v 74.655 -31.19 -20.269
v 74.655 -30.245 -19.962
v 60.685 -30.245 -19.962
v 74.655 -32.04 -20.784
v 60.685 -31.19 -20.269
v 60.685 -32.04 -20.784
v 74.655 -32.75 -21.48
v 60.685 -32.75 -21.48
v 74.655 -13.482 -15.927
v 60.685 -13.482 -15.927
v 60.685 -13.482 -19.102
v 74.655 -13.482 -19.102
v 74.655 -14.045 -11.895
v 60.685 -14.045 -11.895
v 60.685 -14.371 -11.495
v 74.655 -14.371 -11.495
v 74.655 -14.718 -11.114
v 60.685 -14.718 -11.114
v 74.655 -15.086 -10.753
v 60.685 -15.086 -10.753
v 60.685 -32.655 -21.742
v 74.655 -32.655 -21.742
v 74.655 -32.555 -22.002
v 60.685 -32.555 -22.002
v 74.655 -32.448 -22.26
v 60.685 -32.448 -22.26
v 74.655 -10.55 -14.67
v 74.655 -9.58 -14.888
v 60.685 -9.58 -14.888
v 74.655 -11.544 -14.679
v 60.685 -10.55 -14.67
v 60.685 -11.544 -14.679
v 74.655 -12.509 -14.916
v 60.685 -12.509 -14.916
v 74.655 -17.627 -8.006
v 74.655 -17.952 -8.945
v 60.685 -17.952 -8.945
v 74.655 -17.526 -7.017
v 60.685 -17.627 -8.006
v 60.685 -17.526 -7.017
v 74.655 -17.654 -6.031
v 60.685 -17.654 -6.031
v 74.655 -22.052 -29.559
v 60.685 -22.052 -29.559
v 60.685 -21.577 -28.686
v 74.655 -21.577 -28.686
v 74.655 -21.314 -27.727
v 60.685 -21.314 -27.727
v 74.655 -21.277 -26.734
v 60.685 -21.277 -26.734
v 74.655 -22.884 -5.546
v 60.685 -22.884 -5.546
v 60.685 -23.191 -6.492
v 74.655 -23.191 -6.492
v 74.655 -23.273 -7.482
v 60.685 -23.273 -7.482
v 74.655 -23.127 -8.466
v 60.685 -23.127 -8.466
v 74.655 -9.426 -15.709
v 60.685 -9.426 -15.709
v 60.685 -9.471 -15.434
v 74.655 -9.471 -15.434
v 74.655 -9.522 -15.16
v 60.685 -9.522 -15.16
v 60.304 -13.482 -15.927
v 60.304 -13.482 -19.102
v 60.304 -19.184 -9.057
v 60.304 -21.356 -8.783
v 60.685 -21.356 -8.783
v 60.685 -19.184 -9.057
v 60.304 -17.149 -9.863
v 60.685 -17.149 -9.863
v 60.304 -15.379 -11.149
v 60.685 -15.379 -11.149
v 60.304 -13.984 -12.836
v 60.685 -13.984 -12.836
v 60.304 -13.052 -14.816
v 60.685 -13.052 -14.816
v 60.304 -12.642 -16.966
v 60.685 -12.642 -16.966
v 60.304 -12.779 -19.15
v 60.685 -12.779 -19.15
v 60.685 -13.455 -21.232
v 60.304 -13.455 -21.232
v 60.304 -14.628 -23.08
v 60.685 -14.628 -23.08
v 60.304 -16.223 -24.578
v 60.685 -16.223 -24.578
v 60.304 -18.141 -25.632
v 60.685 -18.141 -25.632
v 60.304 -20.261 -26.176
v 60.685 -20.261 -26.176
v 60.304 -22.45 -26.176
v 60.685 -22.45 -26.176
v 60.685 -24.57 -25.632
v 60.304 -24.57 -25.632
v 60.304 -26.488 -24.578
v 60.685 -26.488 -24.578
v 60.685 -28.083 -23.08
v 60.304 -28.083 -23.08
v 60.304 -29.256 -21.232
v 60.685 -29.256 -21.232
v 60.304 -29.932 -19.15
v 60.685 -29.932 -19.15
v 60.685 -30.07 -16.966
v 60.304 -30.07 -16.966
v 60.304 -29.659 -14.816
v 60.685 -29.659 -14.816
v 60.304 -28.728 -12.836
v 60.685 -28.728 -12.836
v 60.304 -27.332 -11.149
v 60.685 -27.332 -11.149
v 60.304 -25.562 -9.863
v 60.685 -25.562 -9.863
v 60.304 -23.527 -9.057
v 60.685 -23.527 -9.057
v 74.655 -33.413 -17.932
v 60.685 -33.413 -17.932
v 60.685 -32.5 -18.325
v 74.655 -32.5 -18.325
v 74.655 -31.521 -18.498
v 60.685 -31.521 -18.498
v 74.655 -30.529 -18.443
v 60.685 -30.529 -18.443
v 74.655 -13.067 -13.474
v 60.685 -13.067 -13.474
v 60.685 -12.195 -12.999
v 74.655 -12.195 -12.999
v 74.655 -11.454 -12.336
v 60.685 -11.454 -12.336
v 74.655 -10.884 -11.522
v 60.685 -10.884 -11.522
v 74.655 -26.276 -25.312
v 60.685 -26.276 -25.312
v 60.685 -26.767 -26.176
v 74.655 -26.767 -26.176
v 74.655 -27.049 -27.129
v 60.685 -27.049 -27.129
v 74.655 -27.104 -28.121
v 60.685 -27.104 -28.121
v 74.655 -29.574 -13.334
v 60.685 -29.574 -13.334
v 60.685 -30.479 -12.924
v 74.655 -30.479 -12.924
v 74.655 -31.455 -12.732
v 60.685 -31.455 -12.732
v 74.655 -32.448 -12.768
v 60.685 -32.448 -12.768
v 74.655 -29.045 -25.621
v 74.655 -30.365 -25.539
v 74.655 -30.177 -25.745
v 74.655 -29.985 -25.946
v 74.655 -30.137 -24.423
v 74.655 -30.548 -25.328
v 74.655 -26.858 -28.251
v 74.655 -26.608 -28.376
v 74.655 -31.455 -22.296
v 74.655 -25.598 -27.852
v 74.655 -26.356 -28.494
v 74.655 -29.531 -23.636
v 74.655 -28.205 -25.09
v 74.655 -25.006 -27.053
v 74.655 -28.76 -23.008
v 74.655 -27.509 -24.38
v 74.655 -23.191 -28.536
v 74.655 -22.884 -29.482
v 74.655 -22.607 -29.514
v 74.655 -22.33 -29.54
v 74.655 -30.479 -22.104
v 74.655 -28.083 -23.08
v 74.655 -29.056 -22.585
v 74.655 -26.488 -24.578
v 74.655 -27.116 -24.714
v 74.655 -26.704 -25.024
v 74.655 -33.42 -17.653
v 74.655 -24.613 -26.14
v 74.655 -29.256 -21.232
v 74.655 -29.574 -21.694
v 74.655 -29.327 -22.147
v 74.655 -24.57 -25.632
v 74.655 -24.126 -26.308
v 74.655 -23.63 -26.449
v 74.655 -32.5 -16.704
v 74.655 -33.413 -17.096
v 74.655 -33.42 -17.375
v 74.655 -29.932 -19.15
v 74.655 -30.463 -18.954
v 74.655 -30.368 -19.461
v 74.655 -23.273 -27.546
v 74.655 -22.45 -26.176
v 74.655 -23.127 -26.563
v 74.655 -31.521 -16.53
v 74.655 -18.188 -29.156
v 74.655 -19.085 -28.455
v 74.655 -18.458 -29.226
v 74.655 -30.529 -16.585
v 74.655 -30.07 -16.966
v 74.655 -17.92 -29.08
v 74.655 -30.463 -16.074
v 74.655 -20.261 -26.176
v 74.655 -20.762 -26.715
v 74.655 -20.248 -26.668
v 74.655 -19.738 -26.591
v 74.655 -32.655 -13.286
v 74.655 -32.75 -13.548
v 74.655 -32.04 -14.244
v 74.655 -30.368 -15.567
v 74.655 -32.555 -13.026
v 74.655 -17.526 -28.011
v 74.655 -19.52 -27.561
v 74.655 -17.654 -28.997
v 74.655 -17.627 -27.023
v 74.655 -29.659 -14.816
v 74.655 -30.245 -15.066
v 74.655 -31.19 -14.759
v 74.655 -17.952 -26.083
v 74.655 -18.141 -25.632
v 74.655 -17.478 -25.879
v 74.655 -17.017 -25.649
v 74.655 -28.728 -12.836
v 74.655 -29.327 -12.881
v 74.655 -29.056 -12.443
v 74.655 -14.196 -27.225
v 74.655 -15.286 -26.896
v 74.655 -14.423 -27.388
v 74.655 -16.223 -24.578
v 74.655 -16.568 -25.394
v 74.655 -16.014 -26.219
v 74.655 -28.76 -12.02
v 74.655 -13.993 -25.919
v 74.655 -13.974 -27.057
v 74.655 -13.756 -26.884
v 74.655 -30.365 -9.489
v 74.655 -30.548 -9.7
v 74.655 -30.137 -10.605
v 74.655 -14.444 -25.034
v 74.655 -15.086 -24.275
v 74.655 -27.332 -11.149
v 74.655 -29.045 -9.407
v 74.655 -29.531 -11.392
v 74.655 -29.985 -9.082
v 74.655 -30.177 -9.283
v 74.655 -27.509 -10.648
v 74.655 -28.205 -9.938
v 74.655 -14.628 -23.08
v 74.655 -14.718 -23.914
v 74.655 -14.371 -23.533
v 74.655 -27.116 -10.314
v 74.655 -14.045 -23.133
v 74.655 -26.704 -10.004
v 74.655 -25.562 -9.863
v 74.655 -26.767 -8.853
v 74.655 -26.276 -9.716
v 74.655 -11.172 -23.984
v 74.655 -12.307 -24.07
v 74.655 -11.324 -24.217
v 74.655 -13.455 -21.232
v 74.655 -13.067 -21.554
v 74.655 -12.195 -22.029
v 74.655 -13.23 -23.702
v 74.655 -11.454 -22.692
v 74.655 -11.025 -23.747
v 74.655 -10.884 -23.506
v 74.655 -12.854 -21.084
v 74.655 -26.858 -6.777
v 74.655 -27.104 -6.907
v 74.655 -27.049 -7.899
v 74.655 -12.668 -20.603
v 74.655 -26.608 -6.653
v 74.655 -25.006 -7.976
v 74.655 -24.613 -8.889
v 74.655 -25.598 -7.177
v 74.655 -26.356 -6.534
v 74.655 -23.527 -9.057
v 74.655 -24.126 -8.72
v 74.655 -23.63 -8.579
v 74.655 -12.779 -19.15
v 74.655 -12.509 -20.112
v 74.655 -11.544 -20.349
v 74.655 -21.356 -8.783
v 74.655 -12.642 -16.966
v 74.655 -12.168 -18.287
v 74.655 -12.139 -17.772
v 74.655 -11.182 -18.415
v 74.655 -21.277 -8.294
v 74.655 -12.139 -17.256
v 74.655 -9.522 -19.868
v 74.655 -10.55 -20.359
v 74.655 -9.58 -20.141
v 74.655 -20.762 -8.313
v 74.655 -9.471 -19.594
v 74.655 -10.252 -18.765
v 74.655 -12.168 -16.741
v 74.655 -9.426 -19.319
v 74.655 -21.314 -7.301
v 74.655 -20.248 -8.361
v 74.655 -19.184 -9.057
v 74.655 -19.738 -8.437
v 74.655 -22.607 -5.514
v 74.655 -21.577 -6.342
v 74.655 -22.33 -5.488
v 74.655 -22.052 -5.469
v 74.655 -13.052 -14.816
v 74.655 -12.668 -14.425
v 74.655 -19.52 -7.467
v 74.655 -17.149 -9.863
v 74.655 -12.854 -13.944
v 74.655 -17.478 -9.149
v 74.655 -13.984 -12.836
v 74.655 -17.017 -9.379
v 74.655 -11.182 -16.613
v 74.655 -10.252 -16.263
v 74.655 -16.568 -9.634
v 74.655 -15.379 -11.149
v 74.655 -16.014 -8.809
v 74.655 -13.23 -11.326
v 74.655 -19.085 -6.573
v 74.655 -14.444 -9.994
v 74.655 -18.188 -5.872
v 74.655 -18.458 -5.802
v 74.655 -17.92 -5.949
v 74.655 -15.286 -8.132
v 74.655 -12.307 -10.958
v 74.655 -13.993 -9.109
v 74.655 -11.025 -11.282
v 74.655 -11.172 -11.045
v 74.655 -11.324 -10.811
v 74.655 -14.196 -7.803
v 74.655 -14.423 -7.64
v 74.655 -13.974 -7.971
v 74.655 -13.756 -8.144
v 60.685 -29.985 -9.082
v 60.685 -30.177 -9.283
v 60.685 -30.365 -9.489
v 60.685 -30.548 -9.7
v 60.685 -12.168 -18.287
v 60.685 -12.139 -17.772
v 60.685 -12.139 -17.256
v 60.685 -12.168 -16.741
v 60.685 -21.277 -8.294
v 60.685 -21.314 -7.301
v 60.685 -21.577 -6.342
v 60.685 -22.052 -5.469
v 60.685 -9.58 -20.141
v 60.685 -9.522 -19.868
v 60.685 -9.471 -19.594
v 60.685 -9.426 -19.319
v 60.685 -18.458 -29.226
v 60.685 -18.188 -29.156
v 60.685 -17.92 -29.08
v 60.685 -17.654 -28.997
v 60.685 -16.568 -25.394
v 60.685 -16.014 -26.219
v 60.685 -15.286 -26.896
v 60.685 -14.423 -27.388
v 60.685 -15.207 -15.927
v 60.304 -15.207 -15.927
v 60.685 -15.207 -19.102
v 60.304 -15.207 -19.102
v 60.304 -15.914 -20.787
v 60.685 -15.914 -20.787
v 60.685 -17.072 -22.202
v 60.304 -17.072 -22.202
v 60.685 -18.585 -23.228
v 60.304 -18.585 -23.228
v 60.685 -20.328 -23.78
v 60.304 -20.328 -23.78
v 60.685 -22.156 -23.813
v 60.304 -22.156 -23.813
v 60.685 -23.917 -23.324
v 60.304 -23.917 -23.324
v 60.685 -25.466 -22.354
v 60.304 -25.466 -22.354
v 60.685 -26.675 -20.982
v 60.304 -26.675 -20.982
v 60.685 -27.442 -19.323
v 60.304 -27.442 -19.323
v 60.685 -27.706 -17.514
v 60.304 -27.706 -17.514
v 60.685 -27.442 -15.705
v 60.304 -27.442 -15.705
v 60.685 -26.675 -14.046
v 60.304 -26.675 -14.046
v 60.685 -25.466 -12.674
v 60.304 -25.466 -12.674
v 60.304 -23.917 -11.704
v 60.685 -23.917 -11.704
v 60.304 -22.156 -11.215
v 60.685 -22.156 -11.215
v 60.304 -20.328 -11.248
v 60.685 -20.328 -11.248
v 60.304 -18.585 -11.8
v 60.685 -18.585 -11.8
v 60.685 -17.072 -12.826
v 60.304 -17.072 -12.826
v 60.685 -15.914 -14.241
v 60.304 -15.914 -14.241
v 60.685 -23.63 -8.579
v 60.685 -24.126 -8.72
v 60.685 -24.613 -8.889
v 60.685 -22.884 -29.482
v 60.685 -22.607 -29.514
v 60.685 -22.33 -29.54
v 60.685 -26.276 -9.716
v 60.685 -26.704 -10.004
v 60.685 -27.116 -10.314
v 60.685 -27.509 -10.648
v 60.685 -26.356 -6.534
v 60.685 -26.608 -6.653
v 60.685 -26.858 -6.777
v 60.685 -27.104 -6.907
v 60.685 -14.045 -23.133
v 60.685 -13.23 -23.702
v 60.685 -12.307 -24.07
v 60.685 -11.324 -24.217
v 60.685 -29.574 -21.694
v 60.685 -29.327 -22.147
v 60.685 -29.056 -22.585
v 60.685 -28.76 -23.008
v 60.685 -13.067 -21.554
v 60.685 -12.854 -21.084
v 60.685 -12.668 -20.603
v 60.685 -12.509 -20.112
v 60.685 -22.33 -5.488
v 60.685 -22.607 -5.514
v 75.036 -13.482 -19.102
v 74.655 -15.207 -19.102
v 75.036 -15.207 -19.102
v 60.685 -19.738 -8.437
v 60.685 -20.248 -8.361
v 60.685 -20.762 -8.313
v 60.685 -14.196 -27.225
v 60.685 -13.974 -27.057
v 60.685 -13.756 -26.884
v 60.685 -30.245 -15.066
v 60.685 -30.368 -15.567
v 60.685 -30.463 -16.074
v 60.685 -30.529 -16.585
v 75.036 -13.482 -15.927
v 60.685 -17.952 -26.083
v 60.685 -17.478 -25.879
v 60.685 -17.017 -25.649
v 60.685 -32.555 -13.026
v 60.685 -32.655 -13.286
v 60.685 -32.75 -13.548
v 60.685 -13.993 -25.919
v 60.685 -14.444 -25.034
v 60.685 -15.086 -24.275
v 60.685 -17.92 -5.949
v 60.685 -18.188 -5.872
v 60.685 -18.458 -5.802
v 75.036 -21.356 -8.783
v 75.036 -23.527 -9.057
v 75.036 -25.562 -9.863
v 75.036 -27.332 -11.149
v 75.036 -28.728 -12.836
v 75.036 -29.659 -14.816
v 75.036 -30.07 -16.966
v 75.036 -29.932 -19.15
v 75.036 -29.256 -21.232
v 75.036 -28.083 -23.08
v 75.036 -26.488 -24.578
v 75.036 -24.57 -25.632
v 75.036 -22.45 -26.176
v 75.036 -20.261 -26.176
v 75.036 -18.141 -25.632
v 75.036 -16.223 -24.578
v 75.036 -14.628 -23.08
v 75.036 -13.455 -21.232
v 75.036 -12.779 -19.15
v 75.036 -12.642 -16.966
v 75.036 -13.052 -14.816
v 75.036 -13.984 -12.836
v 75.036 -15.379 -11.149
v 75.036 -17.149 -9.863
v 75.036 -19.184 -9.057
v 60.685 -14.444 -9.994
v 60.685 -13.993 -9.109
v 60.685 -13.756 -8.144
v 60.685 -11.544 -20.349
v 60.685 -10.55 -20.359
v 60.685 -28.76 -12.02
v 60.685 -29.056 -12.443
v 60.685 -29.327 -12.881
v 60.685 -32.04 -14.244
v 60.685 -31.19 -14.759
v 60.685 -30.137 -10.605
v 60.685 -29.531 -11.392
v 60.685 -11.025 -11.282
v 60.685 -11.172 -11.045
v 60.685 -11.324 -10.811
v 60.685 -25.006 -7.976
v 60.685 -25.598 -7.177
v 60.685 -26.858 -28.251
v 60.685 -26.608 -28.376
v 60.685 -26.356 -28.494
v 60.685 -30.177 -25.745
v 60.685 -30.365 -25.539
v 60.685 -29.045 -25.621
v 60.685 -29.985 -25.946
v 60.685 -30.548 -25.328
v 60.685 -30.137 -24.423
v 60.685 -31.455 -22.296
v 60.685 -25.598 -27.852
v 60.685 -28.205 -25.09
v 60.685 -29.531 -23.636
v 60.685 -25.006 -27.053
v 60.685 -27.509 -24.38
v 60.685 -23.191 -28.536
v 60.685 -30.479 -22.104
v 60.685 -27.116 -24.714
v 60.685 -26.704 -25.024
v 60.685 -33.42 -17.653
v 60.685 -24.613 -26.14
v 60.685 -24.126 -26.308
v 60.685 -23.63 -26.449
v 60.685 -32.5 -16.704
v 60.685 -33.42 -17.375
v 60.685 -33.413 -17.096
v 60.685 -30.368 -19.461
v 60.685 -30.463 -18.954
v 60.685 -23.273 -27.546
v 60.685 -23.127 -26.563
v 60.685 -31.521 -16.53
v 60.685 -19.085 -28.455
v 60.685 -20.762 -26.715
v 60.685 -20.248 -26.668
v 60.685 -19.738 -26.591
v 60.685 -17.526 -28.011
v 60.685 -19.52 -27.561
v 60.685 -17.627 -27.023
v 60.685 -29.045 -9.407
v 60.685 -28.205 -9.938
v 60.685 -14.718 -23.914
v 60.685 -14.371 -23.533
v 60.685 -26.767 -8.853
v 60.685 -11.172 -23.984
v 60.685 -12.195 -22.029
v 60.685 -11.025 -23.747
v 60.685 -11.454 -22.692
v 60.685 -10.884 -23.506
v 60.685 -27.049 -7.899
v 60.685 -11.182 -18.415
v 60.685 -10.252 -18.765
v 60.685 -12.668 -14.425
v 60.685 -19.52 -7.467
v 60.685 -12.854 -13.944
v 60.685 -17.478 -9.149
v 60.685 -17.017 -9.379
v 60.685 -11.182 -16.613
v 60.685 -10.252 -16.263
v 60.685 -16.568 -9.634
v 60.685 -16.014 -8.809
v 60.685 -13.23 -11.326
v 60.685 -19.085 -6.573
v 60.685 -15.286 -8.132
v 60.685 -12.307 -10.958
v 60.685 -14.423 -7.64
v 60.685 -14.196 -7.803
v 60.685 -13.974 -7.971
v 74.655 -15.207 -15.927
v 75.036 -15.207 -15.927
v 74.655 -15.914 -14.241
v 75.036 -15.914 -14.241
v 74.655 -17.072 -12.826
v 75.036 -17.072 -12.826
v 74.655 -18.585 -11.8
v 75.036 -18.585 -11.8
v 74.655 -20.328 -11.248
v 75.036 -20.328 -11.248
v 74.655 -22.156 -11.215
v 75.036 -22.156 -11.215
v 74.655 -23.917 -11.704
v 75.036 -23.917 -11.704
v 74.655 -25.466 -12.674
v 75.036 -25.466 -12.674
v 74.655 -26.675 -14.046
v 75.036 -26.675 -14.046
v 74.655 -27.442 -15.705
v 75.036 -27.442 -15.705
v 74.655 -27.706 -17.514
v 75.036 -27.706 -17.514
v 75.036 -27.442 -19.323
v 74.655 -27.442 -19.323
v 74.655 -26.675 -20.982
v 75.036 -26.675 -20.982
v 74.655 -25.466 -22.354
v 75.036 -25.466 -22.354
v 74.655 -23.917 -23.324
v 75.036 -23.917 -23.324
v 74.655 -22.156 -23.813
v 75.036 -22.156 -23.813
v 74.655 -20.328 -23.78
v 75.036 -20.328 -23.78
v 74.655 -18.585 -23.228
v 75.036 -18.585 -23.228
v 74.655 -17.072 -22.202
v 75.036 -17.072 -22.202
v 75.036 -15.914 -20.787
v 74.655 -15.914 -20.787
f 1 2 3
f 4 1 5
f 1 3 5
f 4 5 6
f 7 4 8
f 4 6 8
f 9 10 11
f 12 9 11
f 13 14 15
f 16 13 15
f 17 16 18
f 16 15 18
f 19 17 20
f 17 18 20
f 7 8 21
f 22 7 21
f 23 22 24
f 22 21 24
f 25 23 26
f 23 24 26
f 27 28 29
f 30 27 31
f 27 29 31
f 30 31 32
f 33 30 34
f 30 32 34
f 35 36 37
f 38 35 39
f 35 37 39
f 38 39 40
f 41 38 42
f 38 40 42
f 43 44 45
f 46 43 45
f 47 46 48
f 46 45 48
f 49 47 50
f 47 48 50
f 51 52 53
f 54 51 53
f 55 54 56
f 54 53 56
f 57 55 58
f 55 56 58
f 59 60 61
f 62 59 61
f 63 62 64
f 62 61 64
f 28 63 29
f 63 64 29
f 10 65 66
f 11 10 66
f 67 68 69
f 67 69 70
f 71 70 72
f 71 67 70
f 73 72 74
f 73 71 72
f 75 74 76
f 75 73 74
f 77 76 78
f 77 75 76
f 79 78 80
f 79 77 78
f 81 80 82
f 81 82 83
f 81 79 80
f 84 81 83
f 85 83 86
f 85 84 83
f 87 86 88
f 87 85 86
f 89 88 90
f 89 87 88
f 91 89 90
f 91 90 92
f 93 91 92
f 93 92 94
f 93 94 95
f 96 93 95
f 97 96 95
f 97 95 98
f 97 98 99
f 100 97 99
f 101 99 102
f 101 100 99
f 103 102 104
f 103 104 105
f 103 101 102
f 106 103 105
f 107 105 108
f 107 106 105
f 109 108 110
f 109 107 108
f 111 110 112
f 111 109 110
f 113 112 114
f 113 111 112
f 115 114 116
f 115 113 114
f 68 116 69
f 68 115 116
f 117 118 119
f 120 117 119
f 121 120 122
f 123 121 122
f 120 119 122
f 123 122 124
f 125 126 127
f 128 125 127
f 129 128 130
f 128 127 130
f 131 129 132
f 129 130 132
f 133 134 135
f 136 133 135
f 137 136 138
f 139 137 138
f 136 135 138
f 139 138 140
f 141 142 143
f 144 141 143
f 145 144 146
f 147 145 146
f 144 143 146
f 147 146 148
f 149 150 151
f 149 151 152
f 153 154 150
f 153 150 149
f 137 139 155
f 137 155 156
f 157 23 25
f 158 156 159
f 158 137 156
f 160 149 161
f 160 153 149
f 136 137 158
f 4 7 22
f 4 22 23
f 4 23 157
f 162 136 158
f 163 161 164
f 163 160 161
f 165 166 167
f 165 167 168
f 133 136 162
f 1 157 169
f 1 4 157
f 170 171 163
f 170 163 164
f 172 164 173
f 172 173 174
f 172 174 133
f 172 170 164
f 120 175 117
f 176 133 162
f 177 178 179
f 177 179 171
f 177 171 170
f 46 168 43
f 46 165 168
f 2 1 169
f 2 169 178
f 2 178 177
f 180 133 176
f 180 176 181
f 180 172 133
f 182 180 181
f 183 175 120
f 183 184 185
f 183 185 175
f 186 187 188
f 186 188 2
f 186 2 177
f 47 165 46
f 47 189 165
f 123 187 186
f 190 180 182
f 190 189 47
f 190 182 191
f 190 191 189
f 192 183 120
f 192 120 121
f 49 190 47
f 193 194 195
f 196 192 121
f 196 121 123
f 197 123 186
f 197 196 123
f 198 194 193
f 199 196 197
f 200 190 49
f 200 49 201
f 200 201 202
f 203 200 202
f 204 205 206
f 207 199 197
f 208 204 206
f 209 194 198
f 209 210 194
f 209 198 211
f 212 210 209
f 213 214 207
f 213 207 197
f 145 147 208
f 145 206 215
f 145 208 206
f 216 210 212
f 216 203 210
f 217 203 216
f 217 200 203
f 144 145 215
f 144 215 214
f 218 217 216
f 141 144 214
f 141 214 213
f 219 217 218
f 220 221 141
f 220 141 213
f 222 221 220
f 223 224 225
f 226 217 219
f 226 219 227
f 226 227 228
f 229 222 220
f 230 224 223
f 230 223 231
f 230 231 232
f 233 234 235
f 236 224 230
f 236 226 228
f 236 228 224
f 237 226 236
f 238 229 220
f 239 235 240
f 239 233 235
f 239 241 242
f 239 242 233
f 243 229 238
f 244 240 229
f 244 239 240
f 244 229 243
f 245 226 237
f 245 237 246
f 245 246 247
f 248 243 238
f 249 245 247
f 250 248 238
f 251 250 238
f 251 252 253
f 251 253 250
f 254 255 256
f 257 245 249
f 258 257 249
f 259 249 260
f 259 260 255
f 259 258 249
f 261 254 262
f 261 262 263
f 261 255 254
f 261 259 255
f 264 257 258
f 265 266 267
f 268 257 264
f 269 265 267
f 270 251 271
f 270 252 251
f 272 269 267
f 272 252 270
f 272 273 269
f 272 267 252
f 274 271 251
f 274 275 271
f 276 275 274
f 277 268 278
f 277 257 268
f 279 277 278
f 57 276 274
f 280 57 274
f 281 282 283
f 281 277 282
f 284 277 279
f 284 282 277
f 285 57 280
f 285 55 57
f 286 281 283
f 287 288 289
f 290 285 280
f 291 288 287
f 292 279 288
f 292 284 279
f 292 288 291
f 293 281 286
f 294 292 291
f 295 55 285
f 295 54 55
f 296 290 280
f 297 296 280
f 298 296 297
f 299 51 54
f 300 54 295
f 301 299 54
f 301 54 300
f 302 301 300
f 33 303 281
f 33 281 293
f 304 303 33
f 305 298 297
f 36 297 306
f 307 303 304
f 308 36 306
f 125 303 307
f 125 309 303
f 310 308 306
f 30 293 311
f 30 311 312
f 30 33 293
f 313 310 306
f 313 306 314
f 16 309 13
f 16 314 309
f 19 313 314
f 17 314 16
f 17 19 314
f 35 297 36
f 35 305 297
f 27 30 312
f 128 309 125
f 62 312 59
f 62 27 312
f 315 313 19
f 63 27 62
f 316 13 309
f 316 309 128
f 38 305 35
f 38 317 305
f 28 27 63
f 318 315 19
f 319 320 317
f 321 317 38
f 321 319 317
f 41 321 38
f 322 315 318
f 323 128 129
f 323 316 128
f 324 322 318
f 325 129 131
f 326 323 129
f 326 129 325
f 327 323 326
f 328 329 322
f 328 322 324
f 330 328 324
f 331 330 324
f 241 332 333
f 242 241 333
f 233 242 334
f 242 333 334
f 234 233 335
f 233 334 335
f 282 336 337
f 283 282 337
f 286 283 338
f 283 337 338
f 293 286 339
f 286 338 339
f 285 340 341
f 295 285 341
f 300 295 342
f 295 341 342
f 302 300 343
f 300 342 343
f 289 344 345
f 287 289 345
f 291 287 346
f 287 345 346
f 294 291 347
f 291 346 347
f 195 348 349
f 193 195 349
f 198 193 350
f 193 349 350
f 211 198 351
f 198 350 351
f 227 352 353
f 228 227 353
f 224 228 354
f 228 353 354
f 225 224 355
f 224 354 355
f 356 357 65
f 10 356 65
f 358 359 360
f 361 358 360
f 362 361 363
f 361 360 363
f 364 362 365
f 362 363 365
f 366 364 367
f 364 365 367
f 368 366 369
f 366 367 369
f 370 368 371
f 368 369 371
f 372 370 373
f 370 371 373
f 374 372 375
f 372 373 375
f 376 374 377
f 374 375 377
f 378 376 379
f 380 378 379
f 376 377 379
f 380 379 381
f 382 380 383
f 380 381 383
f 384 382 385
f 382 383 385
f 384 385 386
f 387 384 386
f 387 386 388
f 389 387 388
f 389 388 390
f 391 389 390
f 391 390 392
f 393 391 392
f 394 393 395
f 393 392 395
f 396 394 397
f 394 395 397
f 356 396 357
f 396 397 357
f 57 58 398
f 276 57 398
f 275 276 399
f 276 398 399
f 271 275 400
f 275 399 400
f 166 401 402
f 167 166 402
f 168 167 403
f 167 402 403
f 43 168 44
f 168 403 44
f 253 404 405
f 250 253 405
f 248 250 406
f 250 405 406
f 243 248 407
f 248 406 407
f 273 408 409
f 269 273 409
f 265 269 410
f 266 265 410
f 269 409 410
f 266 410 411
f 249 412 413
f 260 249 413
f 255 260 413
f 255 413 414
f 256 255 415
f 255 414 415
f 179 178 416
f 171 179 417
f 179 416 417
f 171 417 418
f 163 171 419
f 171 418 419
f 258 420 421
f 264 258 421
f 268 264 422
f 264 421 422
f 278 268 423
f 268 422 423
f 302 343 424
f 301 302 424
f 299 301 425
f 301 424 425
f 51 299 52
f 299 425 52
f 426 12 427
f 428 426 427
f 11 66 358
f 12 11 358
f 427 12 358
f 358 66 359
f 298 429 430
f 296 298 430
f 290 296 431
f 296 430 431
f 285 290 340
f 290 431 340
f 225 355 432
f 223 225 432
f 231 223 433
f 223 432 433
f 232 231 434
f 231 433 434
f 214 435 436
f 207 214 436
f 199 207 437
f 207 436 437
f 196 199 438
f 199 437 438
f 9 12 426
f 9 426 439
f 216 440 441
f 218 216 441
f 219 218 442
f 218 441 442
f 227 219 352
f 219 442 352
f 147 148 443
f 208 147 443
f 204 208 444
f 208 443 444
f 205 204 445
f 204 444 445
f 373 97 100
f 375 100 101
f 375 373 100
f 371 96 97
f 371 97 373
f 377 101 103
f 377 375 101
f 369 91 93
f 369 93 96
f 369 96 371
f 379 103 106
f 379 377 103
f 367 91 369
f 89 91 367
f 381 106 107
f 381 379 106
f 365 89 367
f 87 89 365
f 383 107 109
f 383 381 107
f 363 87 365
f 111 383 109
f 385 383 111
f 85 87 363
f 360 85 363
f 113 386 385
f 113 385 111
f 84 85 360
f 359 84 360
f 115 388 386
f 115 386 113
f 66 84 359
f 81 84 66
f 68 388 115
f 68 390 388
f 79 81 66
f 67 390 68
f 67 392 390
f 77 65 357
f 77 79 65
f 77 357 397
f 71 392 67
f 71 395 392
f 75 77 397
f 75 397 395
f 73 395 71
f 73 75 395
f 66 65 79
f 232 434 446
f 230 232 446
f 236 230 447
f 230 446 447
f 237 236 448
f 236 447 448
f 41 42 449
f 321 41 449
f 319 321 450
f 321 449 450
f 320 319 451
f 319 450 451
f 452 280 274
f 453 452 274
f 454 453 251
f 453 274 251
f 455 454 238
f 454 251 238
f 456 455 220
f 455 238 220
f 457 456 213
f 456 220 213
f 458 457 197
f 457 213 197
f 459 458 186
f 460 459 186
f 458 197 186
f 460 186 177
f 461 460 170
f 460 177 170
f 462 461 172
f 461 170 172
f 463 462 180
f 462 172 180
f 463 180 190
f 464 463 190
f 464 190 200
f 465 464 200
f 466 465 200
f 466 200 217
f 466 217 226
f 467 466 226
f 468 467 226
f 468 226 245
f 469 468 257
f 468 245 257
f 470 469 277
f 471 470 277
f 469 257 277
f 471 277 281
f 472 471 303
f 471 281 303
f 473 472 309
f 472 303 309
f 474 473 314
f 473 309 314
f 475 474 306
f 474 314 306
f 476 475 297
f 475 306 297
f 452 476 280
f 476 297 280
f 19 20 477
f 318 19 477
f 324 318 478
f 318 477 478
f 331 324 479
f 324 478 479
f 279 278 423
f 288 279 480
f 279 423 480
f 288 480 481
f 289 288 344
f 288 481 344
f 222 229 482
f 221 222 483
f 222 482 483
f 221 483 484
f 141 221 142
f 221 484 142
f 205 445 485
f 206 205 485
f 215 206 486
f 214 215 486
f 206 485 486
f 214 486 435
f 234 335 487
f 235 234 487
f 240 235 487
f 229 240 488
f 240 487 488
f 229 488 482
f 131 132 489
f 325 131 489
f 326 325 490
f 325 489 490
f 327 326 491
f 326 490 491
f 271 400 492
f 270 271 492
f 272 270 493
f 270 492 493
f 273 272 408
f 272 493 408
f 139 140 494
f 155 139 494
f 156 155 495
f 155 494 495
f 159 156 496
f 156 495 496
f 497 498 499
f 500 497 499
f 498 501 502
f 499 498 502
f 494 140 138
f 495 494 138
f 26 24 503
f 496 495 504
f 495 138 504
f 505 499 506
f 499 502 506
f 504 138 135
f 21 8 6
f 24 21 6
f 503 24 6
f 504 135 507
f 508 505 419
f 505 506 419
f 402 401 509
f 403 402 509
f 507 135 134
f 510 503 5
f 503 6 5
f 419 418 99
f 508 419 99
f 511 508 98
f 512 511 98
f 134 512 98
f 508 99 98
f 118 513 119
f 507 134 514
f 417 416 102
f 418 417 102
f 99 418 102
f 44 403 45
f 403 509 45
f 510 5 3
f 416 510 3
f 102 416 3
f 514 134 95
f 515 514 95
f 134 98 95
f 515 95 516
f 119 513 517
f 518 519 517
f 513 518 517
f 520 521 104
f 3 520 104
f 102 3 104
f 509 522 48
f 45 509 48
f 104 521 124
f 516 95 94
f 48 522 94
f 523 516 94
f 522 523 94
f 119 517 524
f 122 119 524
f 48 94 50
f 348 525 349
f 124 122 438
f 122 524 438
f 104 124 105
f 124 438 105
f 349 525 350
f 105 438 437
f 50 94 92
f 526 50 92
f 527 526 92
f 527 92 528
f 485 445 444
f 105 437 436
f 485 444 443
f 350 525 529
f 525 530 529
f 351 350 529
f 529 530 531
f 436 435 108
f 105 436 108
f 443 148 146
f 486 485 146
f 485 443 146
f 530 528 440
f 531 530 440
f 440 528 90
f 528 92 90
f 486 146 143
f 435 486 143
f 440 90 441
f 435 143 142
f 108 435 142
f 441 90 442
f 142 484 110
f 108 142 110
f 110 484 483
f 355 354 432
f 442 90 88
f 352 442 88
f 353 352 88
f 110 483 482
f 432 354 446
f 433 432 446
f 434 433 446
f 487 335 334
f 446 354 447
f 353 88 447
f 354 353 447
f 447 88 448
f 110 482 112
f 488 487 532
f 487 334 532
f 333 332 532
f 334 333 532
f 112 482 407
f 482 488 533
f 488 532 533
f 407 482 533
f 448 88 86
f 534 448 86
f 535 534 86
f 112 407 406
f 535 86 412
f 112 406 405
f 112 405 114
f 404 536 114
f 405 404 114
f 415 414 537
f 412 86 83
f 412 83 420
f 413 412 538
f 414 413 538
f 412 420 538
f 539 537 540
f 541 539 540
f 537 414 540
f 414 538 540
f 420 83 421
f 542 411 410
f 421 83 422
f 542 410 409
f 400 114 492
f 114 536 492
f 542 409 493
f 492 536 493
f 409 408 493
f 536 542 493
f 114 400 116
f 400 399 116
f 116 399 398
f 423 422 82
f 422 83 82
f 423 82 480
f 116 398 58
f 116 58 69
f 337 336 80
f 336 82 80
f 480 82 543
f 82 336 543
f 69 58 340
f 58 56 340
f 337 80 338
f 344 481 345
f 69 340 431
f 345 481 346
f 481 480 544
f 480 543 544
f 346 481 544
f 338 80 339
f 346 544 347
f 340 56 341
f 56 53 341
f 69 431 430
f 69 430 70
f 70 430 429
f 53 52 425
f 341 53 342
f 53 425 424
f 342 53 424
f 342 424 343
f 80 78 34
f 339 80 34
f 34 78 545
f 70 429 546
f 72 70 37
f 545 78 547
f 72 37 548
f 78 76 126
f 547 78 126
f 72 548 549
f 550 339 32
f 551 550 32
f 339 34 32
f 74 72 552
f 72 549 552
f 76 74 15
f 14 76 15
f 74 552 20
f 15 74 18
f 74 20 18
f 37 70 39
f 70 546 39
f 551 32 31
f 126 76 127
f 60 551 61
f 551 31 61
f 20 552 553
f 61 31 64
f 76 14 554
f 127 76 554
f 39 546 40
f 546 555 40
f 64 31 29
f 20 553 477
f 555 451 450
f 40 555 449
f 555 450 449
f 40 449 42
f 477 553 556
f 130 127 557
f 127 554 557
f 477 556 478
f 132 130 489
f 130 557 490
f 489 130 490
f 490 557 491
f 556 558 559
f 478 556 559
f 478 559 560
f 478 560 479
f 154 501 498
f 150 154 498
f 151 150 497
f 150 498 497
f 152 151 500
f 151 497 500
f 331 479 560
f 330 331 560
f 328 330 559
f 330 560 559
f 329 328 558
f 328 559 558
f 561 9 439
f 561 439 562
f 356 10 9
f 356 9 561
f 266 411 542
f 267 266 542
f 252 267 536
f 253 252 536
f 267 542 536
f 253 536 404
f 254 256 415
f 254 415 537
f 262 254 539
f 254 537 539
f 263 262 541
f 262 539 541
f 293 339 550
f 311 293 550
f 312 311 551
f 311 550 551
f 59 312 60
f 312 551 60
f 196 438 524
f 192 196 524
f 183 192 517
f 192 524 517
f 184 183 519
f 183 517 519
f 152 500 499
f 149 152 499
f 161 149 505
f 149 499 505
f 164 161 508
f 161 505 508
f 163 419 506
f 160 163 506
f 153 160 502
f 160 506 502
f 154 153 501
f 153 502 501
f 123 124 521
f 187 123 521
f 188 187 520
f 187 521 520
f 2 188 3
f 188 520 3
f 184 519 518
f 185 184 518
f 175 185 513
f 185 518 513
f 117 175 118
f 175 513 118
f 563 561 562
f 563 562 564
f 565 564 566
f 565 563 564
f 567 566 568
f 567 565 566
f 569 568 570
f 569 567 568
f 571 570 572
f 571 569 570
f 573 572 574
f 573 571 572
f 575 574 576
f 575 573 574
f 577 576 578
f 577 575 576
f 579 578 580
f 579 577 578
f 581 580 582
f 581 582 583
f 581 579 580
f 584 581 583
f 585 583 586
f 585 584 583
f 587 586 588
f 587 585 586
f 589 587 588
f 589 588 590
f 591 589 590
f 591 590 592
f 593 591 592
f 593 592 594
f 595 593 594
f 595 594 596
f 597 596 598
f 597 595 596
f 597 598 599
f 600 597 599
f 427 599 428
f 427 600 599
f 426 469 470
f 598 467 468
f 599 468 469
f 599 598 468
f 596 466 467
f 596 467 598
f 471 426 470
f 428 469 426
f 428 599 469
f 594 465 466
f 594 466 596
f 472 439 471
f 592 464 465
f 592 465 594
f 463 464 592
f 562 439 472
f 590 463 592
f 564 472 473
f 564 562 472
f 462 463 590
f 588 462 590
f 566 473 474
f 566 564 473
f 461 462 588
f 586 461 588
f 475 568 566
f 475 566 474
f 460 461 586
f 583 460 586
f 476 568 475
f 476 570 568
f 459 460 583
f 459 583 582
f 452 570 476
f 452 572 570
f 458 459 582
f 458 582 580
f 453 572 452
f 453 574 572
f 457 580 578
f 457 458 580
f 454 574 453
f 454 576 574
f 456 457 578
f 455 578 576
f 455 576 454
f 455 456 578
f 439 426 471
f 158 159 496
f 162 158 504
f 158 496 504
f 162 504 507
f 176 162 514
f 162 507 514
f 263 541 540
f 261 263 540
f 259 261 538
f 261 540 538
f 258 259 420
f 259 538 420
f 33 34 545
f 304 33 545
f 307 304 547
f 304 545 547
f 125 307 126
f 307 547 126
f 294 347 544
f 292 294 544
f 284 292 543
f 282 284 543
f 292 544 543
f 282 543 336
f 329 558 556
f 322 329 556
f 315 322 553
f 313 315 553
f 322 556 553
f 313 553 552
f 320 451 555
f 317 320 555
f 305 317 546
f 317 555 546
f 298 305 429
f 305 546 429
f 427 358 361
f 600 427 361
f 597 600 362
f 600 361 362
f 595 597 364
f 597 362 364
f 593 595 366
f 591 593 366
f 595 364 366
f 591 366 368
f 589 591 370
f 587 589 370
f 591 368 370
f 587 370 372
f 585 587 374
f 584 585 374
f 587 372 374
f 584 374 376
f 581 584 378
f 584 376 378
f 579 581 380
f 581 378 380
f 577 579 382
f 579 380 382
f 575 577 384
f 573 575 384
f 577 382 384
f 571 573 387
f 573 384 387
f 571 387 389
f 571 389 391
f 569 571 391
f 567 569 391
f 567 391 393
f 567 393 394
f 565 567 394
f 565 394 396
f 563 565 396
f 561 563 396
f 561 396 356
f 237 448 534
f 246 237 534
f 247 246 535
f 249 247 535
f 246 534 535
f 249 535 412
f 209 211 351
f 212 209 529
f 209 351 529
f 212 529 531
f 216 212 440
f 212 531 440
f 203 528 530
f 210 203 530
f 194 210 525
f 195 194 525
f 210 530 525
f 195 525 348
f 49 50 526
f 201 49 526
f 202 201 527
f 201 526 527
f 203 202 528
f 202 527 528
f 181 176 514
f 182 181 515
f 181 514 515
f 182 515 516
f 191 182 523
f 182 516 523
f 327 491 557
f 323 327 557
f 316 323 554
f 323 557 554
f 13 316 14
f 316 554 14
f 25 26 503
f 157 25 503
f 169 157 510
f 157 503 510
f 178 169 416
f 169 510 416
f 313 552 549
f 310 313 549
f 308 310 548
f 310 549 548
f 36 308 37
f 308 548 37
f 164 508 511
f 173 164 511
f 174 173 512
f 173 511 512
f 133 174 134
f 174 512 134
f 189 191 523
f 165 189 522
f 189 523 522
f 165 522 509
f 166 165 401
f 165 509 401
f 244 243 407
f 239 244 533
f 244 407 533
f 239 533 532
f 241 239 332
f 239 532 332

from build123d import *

# Parameters (mm, degrees)
SPUR_START          = 60.68508869
SPUR_GEAR_AI_DEPTH  = 13.97
SKETCH1_R           = 8.73125
BOSS_EXTRUDE1_DEPTH = 0.381
BOSS_EXTRUDE2_START = 0.381
SKETCH2_R           = 8.73125
BOSS_EXTRUDE2_DEPTH = 0.381


# Read off the part's stored shape, not the designer's step: spur gear_ai
with BuildPart() as part:
    # spur gear_ai outline → spur gear_ai (new body)
    with BuildSketch(Plane.YZ.offset(SPUR_START)):
        with BuildLine():
            ThreePointArc((-11.323917399, -24.217086363), (-11.097675416, -23.865456059), (-10.883753605, -23.506197427))
            ThreePointArc((-10.883753605, -23.506197427), (-11.804950291, -22.339121223), (-13.067398654, -21.553695012))
            ThreePointArc((-13.067398654, -21.553695012), (-12.757964709, -20.844772424), (-12.509041094, -20.112408009))
            ThreePointArc((-12.509041094, -20.112408009), (-11.04694228, -20.382476998), (-9.57991556, -20.14060347))
            ThreePointArc((-9.57991556, -20.14060347), (-9.495974711, -19.730989946), (-9.42627775, -19.318713778))
            ThreePointArc((-9.42627775, -19.318713778), (-10.70686463, -18.563222253), (-12.167791342, -18.286883074))
            ThreePointArc((-12.167791342, -18.286883074), (-12.135345159, -17.514052013), (-12.167791342, -16.741220953))
            ThreePointArc((-12.167791342, -16.741220953), (-10.70686463, -16.464881774), (-9.42627775, -15.709390249))
            ThreePointArc((-9.42627775, -15.709390249), (-9.495974711, -15.297114081), (-9.57991556, -14.887500557))
            ThreePointArc((-9.57991556, -14.887500557), (-11.04694228, -14.645627029), (-12.509041094, -14.915696018))
            ThreePointArc((-12.509041094, -14.915696018), (-12.757964709, -14.183331603), (-13.067398654, -13.474409015))
            ThreePointArc((-13.067398654, -13.474409015), (-11.804950291, -12.688982804), (-10.883753605, -11.5219066))
            ThreePointArc((-10.883753605, -11.5219066), (-11.097675416, -11.162647968), (-11.323917399, -10.811017664))
            ThreePointArc((-11.323917399, -10.811017664), (-12.779253872, -11.115428493), (-14.045060241, -11.895431337))
            ThreePointArc((-14.045060241, -11.895431337), (-14.54173514, -11.302443439), (-15.086366078, -10.753173247))
            ThreePointArc((-15.086366078, -10.753173247), (-14.192896711, -9.564736168), (-13.755502936, -8.143695392))
            ThreePointArc((-13.755502936, -8.143695392), (-14.084758271, -7.885974166), (-14.422746154, -7.639816704))
            ThreePointArc((-14.422746154, -7.639816704), (-15.669841124, -8.44939952), (-16.568400884, -9.633992513))
            ThreePointArc((-16.568400884, -9.633992513), (-17.245748371, -9.260467435), (-17.952020875, -8.945031621))
            ThreePointArc((-17.952020875, -8.945031621), (-17.548198493, -7.514088685), (-17.653680083, -6.031002769))
            ThreePointArc((-17.653680083, -6.031002769), (-18.053801184, -5.909625629), (-18.45788783, -5.802185936))
            ThreePointArc((-18.45788783, -5.802185936), (-19.328314212, -7.007602095), (-19.738271888, -8.436799389))
            ThreePointArc((-19.738271888, -8.436799389), (-20.504812431, -8.333183761), (-21.277340486, -8.294183681))
            ThreePointArc((-21.277340486, -8.294183681), (-21.41770354, -6.813991662), (-22.051814621, -5.469159576))
            ThreePointArc((-22.051814621, -5.469159576), (-22.468762916, -5.500519177), (-22.884374185, -5.546307581))
            ThreePointArc((-22.884374185, -5.546307581), (-23.260576072, -6.98475895), (-23.126564609, -8.465539531))
            ThreePointArc((-23.126564609, -8.465539531), (-23.87877266, -8.645827218), (-24.613222072, -8.888530048))
            ThreePointArc((-24.613222072, -8.888530048), (-25.278813753, -7.55899708), (-26.355914109, -6.53404585))
            ThreePointArc((-26.355914109, -6.53404585), (-26.733378421, -6.713906903), (-27.104383709, -6.906739426))
            ThreePointArc((-27.104383709, -6.906739426), (-26.935552952, -8.383955178), (-26.275671339, -9.716331423))
            ThreePointArc((-26.275671339, -9.716331423), (-26.911957033, -10.156173575), (-27.509136339, -10.647800953))
            ThreePointArc((-27.509136339, -10.647800953), (-28.610064803, -9.648487829), (-29.984686063, -9.081842798))
            ThreePointArc((-29.984686063, -9.081842798), (-30.271687745, -9.385914073), (-30.547980731, -9.699747614))
            ThreePointArc((-30.547980731, -9.699747614), (-29.856918859, -11.016221575), (-28.760287766, -12.020248689))
            ThreePointArc((-28.760287766, -12.020248689), (-29.194717194, -12.660242185), (-29.573974019, -13.33439711))
            ThreePointArc((-29.573974019, -13.33439711), (-30.961552776, -12.800266607), (-32.448044722, -12.768456326))
            ThreePointArc((-32.448044722, -12.768456326), (-32.605822607, -13.155671311), (-32.750088392, -13.548120911))
            ThreePointArc((-32.750088392, -13.548120911), (-31.63012714, -14.526055979), (-30.244852672, -15.066134537))
            ThreePointArc((-30.244852672, -15.066134537), (-30.418753733, -15.819844709), (-30.528867342, -16.585478823))
            ThreePointArc((-30.528867342, -16.585478823), (-32.015696192, -16.588668223), (-33.41329985, -17.095988847))
            ThreePointArc((-33.41329985, -17.095988847), (-33.420545159, -17.514052013), (-33.41329985, -17.93211518))
            ThreePointArc((-33.41329985, -17.93211518), (-32.015696192, -18.439435804), (-30.528867342, -18.442625204))
            ThreePointArc((-30.528867342, -18.442625204), (-30.418753733, -19.208259318), (-30.244852672, -19.96196949))
            ThreePointArc((-30.244852672, -19.96196949), (-31.63012714, -20.502048048), (-32.750088392, -21.479983116))
            ThreePointArc((-32.750088392, -21.479983116), (-32.605822607, -21.872432716), (-32.448044722, -22.259647701))
            ThreePointArc((-32.448044722, -22.259647701), (-30.961552776, -22.22783742), (-29.573974019, -21.693706917))
            ThreePointArc((-29.573974019, -21.693706917), (-29.194717194, -22.367861842), (-28.760287766, -23.007855338))
            ThreePointArc((-28.760287766, -23.007855338), (-29.856918859, -24.011882452), (-30.547980731, -25.328356413))
            ThreePointArc((-30.547980731, -25.328356413), (-30.271687745, -25.642189954), (-29.984686063, -25.946261229))
            ThreePointArc((-29.984686063, -25.946261229), (-28.610064803, -25.379616198), (-27.509136339, -24.380303074))
            ThreePointArc((-27.509136339, -24.380303074), (-26.911957033, -24.871930452), (-26.275671339, -25.311772604))
            ThreePointArc((-26.275671339, -25.311772604), (-26.935552952, -26.644148849), (-27.104383709, -28.121364601))
            ThreePointArc((-27.104383709, -28.121364601), (-26.733378421, -28.314197124), (-26.355914109, -28.494058177))
            ThreePointArc((-26.355914109, -28.494058177), (-25.278813753, -27.469106947), (-24.613222072, -26.139573979))
            ThreePointArc((-24.613222072, -26.139573979), (-23.87877266, -26.382276809), (-23.126564609, -26.562564496))
            ThreePointArc((-23.126564609, -26.562564496), (-23.260576072, -28.043345077), (-22.884374185, -29.481796446))
            ThreePointArc((-22.884374185, -29.481796446), (-22.468762916, -29.527584851), (-22.051814621, -29.558944451))
            ThreePointArc((-22.051814621, -29.558944451), (-21.41770354, -28.214112365), (-21.277340486, -26.733920346))
            ThreePointArc((-21.277340486, -26.733920346), (-20.504812431, -26.694920266), (-19.738271888, -26.591304638))
            ThreePointArc((-19.738271888, -26.591304638), (-19.328314212, -28.020501932), (-18.45788783, -29.225918091))
            ThreePointArc((-18.45788783, -29.225918091), (-18.053801184, -29.118478398), (-17.653680083, -28.997101258))
            ThreePointArc((-17.653680083, -28.997101258), (-17.548198493, -27.514015342), (-17.952020875, -26.083072406))
            ThreePointArc((-17.952020875, -26.083072406), (-17.245748371, -25.767636592), (-16.568400884, -25.394111514))
            ThreePointArc((-16.568400884, -25.394111514), (-15.669841124, -26.578704507), (-14.422746154, -27.388287323))
            ThreePointArc((-14.422746154, -27.388287323), (-14.084758271, -27.142129861), (-13.755502936, -26.884408635))
            ThreePointArc((-13.755502936, -26.884408635), (-14.192896711, -25.463367859), (-15.086366078, -24.27493078))
            ThreePointArc((-15.086366078, -24.27493078), (-14.54173514, -23.725660588), (-14.045060241, -23.13267269))
            ThreePointArc((-14.045060241, -23.13267269), (-12.779253872, -23.912675534), (-11.323917399, -24.217086363))
        make_face()
        with BuildLine():
            Line((-13.481545159, -19.101552014), (-15.207184097, -19.101552014))
            ThreePointArc((-15.207184097, -19.101552014), (-27.705545159, -17.514052014), (-15.207184097, -15.926552014))
            Line((-15.207184097, -15.926552014), (-13.481545159, -15.926552014))
            Line((-13.481545159, -15.926552014), (-13.481545159, -19.101552014))
        make_face(mode=Mode.SUBTRACT)
    extrude(amount=SPUR_GEAR_AI_DEPTH)

    # Sketch1 → Boss-Extrude1 (add)
    with BuildSketch(Plane(origin=(74.65508869, 0, 0), x_dir=(0, 0, -1), z_dir=(1, 0, 0))):
        with Locations(Location((17.514052014, -21.355545159, 0), (0, 0, 180))):
            Circle(SKETCH1_R)
        with BuildLine():
            Line((15.926552014, -13.481545159), (15.926552014, -15.207184097))
            ThreePointArc((15.926552014, -15.207184097), (17.514052014, -27.705545159), (19.101552014, -15.207184097))
            Line((19.101552014, -15.207184097), (19.101552014, -13.481545159))
            Line((19.101552014, -13.481545159), (15.926552014, -13.481545159))
        make_face(mode=Mode.SUBTRACT)
    extrude(amount=BOSS_EXTRUDE1_DEPTH)

    # Sketch2 → Boss-Extrude2 (add)
    with BuildSketch(Plane.ZY.offset(-60.68508869).offset(BOSS_EXTRUDE2_START)):
        with Locations((-17.514052014, -21.355545159)):
            Circle(SKETCH2_R)
        with BuildLine():
            Line((-19.101552014, -13.481545159), (-19.101552014, -15.207184097))
            ThreePointArc((-19.101552014, -15.207184097), (-17.514052014, -27.705545159), (-15.926552014, -15.207184097))
            Line((-15.926552014, -15.207184097), (-15.926552014, -13.481545159))
            Line((-15.926552014, -13.481545159), (-19.101552014, -13.481545159))
        make_face(mode=Mode.SUBTRACT)
    extrude(amount=-BOSS_EXTRUDE2_DEPTH)


solid = part.part
